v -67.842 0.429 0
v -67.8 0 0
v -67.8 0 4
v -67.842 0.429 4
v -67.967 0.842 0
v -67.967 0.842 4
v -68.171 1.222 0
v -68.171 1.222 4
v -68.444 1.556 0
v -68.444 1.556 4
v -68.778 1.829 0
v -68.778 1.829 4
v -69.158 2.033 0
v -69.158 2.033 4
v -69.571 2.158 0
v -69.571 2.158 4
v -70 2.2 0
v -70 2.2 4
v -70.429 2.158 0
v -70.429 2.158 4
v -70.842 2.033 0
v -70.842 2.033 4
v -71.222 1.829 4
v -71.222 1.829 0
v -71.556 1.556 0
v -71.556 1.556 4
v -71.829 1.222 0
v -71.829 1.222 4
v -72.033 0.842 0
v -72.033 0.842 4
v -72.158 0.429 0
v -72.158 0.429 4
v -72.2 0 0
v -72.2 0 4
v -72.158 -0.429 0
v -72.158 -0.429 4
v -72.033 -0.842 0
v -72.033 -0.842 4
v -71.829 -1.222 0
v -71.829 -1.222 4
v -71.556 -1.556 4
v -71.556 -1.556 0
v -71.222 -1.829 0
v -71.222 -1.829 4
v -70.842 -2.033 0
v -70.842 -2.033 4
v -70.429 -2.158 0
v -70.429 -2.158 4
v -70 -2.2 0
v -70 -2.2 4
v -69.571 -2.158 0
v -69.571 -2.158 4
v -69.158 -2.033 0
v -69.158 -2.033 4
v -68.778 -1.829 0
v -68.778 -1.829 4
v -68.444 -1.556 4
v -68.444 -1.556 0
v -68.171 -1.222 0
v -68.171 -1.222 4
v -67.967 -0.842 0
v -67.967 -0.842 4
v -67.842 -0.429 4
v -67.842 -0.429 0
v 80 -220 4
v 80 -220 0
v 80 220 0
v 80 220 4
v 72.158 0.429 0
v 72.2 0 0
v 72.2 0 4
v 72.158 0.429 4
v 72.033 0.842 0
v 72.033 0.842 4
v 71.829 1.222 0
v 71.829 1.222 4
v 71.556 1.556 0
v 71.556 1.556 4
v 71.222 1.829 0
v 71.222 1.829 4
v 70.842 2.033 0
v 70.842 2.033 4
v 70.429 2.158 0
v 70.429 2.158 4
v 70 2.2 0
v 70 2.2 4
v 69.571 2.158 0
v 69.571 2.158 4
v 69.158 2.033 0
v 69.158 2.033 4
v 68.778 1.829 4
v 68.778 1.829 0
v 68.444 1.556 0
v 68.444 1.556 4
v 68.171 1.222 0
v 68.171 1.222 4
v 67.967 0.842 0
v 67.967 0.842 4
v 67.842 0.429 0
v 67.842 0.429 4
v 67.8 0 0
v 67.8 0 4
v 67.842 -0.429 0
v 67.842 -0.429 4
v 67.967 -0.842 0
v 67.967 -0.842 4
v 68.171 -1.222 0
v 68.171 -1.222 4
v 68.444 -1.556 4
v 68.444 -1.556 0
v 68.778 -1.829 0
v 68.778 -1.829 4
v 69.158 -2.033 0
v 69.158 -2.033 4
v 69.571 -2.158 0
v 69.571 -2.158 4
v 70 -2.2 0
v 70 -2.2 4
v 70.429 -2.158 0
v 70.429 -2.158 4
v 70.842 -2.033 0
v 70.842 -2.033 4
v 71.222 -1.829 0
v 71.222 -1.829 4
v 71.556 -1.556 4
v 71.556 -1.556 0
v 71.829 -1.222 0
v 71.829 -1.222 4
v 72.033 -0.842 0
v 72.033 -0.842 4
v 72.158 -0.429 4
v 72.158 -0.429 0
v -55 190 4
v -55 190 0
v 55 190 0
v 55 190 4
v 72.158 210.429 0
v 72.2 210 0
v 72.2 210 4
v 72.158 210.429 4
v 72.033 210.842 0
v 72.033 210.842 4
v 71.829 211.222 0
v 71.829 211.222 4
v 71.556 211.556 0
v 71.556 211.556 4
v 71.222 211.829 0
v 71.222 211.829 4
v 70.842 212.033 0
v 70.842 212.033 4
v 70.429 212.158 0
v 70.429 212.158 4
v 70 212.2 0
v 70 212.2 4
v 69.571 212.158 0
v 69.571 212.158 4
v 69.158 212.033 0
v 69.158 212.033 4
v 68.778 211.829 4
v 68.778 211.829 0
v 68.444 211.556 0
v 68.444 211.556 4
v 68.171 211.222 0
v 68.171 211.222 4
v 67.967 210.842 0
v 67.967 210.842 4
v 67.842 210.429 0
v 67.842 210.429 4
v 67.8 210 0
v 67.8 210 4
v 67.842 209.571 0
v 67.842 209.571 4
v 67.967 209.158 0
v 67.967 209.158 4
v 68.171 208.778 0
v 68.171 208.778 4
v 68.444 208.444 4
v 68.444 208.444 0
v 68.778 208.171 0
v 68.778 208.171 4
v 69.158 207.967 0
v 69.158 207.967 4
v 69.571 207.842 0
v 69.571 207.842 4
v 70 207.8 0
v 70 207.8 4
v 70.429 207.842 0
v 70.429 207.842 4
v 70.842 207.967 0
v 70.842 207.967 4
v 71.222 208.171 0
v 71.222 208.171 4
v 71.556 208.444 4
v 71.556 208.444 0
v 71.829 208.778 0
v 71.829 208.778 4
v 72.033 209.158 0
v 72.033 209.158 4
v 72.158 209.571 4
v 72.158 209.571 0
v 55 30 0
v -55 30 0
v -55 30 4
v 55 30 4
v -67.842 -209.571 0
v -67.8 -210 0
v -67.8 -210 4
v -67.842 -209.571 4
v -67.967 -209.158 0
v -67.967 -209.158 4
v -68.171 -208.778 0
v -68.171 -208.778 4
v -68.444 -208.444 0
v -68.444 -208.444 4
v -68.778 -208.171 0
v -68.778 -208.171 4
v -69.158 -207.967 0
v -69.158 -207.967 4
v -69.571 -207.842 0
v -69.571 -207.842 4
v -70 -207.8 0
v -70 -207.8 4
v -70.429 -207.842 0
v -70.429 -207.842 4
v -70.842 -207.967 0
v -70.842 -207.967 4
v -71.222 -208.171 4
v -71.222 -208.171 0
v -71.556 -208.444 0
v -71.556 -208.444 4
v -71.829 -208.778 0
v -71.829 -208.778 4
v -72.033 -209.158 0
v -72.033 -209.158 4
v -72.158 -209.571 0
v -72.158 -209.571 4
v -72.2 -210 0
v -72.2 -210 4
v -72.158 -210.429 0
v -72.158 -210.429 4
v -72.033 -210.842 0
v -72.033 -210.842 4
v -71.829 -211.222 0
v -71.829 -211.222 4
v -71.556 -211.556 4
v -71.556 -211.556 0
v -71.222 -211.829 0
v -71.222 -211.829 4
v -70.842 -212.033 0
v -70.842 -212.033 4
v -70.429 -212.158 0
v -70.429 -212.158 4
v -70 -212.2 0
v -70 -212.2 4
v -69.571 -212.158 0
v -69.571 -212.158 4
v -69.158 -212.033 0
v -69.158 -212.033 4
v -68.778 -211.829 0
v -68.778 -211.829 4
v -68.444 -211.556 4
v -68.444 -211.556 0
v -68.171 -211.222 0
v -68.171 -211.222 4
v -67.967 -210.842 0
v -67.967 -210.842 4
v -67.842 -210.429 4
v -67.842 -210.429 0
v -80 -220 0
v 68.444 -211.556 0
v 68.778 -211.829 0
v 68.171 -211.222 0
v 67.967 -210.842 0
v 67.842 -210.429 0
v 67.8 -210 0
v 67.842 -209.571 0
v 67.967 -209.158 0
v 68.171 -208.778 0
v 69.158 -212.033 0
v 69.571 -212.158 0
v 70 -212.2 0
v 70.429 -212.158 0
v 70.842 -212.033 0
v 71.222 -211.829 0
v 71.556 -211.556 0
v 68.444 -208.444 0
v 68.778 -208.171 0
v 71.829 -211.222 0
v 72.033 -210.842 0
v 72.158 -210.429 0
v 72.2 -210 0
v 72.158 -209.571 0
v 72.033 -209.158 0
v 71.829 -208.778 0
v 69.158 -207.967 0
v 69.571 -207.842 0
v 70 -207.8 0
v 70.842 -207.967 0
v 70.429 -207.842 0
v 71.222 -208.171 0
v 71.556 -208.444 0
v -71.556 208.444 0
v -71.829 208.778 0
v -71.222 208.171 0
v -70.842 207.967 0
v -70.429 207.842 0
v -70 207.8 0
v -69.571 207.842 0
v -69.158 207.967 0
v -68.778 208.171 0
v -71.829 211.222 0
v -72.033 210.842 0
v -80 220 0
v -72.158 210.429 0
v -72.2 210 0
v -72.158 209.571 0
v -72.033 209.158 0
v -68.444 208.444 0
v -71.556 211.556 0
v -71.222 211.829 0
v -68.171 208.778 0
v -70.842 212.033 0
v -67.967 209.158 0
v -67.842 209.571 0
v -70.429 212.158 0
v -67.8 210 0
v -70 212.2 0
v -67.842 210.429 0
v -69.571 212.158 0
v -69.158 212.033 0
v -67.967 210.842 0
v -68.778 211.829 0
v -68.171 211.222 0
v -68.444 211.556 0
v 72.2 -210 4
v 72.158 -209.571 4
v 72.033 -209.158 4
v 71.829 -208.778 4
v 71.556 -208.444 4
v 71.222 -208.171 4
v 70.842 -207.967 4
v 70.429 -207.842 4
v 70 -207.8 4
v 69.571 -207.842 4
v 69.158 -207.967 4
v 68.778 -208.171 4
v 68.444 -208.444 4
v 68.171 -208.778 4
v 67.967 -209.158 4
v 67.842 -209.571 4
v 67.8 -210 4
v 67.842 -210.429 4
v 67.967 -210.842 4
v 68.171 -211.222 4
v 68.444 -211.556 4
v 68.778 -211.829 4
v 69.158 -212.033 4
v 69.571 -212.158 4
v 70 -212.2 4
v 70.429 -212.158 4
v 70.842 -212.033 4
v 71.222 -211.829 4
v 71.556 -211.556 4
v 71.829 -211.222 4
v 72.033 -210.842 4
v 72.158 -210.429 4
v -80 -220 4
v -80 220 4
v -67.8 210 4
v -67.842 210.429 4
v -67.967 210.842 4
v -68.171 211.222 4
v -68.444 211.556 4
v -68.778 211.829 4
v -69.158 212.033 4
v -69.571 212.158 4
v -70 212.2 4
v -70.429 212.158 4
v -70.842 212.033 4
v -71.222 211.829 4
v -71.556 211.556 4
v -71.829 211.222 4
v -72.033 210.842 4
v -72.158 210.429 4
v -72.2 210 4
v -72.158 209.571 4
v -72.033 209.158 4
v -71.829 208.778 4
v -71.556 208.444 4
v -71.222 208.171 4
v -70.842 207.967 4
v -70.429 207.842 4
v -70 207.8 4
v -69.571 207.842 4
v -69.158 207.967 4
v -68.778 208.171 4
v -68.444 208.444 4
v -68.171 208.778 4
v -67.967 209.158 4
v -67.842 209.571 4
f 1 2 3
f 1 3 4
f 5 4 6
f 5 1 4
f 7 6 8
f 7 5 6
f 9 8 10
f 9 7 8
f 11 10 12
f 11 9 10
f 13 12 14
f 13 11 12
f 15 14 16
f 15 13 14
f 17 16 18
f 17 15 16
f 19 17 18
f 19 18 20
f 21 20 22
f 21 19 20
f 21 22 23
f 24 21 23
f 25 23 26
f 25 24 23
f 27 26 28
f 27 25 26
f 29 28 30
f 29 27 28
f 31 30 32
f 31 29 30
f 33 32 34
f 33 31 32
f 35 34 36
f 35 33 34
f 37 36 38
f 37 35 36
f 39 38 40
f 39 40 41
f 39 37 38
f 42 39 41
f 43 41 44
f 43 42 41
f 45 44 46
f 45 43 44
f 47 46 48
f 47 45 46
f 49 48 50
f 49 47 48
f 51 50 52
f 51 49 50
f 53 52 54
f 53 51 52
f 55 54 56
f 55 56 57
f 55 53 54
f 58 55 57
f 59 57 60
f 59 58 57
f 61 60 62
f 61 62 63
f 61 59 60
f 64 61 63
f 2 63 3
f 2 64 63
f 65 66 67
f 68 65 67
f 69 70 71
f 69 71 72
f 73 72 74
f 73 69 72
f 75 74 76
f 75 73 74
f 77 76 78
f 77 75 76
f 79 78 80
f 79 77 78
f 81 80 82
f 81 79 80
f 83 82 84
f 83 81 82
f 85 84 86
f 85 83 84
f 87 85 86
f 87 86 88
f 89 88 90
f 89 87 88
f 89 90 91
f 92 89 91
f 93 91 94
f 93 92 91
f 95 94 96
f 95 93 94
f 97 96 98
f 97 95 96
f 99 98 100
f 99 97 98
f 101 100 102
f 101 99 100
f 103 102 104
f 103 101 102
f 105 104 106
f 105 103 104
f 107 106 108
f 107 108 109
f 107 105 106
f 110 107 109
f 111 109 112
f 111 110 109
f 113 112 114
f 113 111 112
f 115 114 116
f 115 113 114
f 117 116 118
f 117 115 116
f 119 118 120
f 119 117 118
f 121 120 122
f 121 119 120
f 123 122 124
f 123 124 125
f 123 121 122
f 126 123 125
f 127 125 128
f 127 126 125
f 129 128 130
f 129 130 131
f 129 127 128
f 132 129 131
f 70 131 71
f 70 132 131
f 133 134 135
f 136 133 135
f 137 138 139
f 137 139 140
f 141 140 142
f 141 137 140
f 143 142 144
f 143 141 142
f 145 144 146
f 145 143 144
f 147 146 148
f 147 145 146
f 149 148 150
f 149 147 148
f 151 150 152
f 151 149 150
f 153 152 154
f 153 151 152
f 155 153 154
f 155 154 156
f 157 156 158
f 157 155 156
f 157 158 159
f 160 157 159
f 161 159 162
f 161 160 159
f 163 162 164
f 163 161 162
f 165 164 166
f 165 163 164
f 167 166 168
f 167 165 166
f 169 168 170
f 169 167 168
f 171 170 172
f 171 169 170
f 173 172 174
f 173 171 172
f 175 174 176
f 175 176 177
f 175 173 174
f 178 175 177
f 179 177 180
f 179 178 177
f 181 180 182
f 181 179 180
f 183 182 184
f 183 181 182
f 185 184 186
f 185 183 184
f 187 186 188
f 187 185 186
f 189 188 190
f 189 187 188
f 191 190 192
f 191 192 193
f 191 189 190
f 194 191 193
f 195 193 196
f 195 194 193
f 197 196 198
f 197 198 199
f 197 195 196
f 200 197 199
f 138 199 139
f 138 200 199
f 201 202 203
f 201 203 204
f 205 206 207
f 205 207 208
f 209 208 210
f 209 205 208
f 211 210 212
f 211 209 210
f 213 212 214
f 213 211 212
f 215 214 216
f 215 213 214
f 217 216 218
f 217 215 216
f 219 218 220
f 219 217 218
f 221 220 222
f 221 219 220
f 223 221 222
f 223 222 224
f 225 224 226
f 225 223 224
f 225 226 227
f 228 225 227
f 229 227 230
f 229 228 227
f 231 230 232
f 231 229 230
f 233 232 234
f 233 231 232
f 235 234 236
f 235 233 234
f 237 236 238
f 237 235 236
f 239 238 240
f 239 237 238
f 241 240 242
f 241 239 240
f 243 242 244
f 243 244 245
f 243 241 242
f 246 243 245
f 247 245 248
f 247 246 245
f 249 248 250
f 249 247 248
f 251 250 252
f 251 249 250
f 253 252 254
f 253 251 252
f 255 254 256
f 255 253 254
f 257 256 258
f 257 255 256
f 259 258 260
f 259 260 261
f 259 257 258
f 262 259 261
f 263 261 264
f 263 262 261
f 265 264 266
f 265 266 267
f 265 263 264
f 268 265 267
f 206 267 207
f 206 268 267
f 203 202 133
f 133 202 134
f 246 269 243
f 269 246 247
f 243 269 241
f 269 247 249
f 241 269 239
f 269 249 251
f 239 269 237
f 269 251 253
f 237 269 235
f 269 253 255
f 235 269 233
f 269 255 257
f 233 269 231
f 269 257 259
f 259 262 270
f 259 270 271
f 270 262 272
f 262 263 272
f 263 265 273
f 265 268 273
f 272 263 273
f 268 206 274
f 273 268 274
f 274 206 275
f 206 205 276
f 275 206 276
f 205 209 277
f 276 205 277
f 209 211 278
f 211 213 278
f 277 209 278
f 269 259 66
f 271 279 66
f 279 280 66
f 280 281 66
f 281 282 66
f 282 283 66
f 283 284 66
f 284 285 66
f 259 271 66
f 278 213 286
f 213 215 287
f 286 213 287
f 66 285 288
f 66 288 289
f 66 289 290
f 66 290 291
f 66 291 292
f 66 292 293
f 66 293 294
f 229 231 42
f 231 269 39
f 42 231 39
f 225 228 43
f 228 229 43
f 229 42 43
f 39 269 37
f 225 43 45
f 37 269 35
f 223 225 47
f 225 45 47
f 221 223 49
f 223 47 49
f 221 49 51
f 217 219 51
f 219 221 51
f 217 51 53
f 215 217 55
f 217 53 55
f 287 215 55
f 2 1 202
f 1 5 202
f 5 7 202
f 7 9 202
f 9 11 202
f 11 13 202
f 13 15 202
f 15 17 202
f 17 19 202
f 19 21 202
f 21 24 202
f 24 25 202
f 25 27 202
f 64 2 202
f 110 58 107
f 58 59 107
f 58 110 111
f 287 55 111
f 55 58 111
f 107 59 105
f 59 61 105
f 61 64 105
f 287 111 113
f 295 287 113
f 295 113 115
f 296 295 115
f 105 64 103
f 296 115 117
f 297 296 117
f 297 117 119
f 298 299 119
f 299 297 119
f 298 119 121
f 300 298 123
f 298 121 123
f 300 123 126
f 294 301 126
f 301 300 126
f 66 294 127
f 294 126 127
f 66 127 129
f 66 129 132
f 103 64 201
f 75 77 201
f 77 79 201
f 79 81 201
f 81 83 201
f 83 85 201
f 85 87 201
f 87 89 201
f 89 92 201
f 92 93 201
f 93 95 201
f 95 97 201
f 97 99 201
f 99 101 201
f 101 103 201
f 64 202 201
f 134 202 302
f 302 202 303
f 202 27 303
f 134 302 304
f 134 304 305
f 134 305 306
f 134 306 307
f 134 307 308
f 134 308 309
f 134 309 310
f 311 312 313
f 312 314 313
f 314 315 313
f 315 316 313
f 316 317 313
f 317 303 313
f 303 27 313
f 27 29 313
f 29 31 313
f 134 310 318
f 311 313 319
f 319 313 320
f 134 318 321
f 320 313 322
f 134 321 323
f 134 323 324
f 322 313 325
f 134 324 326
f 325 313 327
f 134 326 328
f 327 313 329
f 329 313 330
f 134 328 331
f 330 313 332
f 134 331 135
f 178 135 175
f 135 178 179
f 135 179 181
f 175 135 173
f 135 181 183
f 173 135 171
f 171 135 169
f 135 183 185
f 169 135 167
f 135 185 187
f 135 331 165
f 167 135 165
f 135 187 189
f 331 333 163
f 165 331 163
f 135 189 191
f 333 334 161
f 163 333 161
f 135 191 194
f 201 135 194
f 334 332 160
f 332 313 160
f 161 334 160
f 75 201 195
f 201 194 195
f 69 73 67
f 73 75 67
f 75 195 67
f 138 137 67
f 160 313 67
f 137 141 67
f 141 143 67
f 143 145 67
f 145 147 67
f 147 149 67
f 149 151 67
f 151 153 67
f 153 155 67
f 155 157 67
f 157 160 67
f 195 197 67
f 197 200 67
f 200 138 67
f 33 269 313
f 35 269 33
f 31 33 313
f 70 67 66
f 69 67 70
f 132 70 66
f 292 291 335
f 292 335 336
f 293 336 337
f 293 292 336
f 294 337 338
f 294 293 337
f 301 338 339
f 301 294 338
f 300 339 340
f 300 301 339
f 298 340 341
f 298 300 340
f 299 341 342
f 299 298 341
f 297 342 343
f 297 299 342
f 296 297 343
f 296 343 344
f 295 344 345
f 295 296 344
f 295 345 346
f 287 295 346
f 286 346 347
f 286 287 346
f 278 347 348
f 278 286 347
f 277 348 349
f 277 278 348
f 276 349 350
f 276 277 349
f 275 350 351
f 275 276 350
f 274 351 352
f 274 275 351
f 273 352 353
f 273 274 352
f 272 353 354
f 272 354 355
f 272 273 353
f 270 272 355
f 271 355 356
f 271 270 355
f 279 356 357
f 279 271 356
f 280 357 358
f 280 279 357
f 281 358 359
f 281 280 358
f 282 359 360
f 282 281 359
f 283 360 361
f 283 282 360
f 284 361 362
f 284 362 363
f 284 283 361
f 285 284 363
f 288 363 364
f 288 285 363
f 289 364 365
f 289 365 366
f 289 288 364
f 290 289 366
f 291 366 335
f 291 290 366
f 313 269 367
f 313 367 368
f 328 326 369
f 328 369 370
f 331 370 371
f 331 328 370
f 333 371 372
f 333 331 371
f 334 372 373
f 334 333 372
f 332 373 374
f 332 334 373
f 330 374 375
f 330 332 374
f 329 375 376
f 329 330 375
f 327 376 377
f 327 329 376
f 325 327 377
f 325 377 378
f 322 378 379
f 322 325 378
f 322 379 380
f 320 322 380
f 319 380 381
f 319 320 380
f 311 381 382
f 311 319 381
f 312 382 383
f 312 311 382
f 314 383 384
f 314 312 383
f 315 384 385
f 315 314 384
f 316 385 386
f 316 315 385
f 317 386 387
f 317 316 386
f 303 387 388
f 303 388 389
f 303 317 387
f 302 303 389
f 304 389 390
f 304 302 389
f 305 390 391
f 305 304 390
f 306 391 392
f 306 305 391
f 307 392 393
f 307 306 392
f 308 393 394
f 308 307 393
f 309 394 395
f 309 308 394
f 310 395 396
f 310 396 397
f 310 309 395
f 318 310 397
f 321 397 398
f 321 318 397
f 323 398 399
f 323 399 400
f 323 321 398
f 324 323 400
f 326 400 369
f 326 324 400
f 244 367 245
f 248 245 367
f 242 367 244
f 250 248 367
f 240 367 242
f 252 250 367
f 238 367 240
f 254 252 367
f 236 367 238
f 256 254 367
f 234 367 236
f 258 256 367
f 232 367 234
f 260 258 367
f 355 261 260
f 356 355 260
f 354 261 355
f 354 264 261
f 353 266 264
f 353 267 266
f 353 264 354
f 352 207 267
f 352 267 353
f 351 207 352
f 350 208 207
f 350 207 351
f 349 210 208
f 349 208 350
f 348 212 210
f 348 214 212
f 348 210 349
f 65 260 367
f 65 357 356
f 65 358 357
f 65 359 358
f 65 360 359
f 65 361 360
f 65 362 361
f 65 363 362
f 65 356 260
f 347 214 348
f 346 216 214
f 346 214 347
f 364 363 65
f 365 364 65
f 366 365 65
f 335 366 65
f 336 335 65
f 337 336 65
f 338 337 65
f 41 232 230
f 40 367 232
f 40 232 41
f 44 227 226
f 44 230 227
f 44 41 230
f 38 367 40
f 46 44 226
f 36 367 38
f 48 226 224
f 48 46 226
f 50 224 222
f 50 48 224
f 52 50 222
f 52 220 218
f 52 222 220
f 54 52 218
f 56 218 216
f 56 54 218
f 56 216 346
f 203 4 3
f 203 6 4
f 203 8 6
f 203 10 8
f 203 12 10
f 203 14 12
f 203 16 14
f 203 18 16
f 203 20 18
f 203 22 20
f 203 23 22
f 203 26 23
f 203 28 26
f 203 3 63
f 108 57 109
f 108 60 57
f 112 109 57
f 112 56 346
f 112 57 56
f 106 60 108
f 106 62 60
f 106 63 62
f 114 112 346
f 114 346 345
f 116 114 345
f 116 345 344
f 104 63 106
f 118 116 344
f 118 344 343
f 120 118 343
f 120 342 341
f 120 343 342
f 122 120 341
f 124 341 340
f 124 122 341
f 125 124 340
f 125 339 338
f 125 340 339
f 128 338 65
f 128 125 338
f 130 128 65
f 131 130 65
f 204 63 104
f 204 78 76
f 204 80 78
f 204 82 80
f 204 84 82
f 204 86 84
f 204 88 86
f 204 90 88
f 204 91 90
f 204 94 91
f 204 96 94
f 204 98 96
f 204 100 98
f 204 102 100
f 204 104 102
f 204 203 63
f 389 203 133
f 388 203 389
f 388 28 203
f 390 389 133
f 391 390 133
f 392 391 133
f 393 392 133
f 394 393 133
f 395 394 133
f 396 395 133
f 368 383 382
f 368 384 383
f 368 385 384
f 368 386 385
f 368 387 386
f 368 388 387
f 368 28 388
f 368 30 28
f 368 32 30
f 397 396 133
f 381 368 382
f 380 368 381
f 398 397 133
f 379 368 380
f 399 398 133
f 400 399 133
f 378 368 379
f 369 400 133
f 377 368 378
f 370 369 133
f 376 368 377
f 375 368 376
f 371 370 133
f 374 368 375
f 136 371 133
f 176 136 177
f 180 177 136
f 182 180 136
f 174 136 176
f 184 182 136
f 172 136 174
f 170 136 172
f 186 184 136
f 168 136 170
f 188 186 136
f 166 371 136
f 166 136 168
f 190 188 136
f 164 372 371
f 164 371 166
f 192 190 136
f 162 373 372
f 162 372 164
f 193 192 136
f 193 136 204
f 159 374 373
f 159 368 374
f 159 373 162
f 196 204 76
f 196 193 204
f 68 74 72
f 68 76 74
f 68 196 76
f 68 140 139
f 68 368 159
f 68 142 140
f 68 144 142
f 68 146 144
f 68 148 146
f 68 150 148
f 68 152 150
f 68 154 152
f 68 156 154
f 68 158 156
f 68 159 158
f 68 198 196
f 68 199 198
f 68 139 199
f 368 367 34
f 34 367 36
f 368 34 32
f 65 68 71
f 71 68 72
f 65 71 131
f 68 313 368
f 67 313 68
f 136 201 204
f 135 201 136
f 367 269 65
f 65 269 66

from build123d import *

# Parameters (mm, degrees)
ESQUISSE1_W        = 160
ESQUISSE1_H        = 440
ESQUISSE1_R        = 2.2
ESQUISSE1_W_2      = 110
ESQUISSE1_H_2      = 160
BOSS_EXTRU_1_DEPTH = 4


with BuildPart() as part:
    # Esquisse1 → Boss.-Extru.1 (new body)
    with BuildSketch(Plane.XY):
        Rectangle(ESQUISSE1_W, ESQUISSE1_H)
        with Locations((70, 0)):
            Circle(ESQUISSE1_R, mode=Mode.SUBTRACT)
        with Locations((70, 210)):
            Circle(ESQUISSE1_R, mode=Mode.SUBTRACT)
        with Locations((70, -210)):
            Circle(ESQUISSE1_R, mode=Mode.SUBTRACT)
        with Locations((-70, 210)):
            Circle(ESQUISSE1_R, mode=Mode.SUBTRACT)
        with Locations((-70, 0)):
            Circle(ESQUISSE1_R, mode=Mode.SUBTRACT)
        with Locations((-70, -210)):
            Circle(ESQUISSE1_R, mode=Mode.SUBTRACT)
        with Locations((0, 110)):
            Rectangle(ESQUISSE1_W_2, ESQUISSE1_H_2, mode=Mode.SUBTRACT)
    extrude(amount=BOSS_EXTRU_1_DEPTH)


solid = part.part
